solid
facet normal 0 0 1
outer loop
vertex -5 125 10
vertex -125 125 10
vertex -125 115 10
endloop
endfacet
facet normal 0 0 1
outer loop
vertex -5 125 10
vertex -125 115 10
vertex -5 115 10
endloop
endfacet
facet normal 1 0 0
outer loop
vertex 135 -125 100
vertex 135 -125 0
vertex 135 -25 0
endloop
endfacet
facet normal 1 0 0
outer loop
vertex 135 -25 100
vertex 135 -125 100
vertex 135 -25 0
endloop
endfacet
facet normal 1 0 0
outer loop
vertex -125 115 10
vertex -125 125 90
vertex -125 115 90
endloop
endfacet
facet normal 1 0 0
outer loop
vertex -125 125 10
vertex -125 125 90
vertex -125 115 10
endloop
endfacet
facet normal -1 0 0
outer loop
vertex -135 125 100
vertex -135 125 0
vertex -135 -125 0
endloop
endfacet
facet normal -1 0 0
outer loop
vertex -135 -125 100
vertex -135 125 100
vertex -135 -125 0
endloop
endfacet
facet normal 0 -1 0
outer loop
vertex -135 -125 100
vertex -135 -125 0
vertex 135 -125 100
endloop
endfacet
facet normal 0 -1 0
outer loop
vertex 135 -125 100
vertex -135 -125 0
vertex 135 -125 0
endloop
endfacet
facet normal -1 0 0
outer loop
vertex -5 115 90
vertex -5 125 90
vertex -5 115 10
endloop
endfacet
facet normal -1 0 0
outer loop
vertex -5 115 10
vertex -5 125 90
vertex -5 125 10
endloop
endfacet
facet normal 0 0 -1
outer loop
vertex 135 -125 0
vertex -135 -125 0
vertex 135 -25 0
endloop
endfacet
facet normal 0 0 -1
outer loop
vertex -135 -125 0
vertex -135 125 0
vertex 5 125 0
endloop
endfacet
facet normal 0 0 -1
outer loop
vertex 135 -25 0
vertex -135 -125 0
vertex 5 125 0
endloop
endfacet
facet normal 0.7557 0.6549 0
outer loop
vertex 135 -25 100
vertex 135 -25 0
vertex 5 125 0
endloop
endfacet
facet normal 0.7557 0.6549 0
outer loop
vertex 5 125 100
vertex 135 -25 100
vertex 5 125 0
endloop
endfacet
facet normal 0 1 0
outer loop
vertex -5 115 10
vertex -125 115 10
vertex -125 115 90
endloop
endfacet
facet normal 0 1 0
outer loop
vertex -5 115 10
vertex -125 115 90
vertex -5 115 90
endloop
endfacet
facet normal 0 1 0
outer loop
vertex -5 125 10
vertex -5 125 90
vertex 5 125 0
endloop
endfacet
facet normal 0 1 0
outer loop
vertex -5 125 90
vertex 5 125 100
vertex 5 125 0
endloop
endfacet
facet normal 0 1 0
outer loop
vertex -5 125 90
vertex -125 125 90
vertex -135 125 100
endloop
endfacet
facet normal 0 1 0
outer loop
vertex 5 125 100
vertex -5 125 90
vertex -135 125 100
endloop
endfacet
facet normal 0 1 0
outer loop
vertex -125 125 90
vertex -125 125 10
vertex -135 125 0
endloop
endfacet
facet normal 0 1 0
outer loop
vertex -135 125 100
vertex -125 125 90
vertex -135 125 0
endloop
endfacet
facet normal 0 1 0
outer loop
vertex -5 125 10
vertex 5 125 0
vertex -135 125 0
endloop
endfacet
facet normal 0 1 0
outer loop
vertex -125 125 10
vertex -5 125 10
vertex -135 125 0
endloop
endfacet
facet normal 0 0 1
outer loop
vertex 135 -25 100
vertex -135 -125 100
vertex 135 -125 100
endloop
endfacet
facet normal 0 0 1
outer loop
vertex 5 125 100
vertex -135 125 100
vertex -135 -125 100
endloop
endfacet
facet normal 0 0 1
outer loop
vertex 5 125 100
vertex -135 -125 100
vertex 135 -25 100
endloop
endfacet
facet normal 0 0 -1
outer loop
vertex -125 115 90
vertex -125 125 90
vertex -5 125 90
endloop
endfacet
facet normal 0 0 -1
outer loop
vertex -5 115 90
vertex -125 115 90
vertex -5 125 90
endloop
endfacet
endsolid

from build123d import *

# Parameters (mm, degrees)
BOSS_EXTRUDE1_DEPTH = 100
SKETCH2_W           = 120
SKETCH2_H           = 80
CUT_EXTRUDE1_DEPTH  = 10


with BuildPart() as part:
    # Sketch1 → Boss-Extrude1 (new body)
    with BuildSketch(Plane.XY):
        Polygon((135, -25), (5, 125), (-135, 125), (-135, -125), (135, -125), align=None)
    extrude(amount=BOSS_EXTRUDE1_DEPTH)

    # Sketch2 → Cut-Extrude1 (cut)
    with BuildSketch(Plane(origin=(0, 125, 0), x_dir=(1, 0, 0), z_dir=(0, 1, 0))):
        with Locations((-65, -50)):
            Rectangle(SKETCH2_W, SKETCH2_H)
    extrude(amount=-CUT_EXTRUDE1_DEPTH, mode=Mode.SUBTRACT)


solid = part.part
